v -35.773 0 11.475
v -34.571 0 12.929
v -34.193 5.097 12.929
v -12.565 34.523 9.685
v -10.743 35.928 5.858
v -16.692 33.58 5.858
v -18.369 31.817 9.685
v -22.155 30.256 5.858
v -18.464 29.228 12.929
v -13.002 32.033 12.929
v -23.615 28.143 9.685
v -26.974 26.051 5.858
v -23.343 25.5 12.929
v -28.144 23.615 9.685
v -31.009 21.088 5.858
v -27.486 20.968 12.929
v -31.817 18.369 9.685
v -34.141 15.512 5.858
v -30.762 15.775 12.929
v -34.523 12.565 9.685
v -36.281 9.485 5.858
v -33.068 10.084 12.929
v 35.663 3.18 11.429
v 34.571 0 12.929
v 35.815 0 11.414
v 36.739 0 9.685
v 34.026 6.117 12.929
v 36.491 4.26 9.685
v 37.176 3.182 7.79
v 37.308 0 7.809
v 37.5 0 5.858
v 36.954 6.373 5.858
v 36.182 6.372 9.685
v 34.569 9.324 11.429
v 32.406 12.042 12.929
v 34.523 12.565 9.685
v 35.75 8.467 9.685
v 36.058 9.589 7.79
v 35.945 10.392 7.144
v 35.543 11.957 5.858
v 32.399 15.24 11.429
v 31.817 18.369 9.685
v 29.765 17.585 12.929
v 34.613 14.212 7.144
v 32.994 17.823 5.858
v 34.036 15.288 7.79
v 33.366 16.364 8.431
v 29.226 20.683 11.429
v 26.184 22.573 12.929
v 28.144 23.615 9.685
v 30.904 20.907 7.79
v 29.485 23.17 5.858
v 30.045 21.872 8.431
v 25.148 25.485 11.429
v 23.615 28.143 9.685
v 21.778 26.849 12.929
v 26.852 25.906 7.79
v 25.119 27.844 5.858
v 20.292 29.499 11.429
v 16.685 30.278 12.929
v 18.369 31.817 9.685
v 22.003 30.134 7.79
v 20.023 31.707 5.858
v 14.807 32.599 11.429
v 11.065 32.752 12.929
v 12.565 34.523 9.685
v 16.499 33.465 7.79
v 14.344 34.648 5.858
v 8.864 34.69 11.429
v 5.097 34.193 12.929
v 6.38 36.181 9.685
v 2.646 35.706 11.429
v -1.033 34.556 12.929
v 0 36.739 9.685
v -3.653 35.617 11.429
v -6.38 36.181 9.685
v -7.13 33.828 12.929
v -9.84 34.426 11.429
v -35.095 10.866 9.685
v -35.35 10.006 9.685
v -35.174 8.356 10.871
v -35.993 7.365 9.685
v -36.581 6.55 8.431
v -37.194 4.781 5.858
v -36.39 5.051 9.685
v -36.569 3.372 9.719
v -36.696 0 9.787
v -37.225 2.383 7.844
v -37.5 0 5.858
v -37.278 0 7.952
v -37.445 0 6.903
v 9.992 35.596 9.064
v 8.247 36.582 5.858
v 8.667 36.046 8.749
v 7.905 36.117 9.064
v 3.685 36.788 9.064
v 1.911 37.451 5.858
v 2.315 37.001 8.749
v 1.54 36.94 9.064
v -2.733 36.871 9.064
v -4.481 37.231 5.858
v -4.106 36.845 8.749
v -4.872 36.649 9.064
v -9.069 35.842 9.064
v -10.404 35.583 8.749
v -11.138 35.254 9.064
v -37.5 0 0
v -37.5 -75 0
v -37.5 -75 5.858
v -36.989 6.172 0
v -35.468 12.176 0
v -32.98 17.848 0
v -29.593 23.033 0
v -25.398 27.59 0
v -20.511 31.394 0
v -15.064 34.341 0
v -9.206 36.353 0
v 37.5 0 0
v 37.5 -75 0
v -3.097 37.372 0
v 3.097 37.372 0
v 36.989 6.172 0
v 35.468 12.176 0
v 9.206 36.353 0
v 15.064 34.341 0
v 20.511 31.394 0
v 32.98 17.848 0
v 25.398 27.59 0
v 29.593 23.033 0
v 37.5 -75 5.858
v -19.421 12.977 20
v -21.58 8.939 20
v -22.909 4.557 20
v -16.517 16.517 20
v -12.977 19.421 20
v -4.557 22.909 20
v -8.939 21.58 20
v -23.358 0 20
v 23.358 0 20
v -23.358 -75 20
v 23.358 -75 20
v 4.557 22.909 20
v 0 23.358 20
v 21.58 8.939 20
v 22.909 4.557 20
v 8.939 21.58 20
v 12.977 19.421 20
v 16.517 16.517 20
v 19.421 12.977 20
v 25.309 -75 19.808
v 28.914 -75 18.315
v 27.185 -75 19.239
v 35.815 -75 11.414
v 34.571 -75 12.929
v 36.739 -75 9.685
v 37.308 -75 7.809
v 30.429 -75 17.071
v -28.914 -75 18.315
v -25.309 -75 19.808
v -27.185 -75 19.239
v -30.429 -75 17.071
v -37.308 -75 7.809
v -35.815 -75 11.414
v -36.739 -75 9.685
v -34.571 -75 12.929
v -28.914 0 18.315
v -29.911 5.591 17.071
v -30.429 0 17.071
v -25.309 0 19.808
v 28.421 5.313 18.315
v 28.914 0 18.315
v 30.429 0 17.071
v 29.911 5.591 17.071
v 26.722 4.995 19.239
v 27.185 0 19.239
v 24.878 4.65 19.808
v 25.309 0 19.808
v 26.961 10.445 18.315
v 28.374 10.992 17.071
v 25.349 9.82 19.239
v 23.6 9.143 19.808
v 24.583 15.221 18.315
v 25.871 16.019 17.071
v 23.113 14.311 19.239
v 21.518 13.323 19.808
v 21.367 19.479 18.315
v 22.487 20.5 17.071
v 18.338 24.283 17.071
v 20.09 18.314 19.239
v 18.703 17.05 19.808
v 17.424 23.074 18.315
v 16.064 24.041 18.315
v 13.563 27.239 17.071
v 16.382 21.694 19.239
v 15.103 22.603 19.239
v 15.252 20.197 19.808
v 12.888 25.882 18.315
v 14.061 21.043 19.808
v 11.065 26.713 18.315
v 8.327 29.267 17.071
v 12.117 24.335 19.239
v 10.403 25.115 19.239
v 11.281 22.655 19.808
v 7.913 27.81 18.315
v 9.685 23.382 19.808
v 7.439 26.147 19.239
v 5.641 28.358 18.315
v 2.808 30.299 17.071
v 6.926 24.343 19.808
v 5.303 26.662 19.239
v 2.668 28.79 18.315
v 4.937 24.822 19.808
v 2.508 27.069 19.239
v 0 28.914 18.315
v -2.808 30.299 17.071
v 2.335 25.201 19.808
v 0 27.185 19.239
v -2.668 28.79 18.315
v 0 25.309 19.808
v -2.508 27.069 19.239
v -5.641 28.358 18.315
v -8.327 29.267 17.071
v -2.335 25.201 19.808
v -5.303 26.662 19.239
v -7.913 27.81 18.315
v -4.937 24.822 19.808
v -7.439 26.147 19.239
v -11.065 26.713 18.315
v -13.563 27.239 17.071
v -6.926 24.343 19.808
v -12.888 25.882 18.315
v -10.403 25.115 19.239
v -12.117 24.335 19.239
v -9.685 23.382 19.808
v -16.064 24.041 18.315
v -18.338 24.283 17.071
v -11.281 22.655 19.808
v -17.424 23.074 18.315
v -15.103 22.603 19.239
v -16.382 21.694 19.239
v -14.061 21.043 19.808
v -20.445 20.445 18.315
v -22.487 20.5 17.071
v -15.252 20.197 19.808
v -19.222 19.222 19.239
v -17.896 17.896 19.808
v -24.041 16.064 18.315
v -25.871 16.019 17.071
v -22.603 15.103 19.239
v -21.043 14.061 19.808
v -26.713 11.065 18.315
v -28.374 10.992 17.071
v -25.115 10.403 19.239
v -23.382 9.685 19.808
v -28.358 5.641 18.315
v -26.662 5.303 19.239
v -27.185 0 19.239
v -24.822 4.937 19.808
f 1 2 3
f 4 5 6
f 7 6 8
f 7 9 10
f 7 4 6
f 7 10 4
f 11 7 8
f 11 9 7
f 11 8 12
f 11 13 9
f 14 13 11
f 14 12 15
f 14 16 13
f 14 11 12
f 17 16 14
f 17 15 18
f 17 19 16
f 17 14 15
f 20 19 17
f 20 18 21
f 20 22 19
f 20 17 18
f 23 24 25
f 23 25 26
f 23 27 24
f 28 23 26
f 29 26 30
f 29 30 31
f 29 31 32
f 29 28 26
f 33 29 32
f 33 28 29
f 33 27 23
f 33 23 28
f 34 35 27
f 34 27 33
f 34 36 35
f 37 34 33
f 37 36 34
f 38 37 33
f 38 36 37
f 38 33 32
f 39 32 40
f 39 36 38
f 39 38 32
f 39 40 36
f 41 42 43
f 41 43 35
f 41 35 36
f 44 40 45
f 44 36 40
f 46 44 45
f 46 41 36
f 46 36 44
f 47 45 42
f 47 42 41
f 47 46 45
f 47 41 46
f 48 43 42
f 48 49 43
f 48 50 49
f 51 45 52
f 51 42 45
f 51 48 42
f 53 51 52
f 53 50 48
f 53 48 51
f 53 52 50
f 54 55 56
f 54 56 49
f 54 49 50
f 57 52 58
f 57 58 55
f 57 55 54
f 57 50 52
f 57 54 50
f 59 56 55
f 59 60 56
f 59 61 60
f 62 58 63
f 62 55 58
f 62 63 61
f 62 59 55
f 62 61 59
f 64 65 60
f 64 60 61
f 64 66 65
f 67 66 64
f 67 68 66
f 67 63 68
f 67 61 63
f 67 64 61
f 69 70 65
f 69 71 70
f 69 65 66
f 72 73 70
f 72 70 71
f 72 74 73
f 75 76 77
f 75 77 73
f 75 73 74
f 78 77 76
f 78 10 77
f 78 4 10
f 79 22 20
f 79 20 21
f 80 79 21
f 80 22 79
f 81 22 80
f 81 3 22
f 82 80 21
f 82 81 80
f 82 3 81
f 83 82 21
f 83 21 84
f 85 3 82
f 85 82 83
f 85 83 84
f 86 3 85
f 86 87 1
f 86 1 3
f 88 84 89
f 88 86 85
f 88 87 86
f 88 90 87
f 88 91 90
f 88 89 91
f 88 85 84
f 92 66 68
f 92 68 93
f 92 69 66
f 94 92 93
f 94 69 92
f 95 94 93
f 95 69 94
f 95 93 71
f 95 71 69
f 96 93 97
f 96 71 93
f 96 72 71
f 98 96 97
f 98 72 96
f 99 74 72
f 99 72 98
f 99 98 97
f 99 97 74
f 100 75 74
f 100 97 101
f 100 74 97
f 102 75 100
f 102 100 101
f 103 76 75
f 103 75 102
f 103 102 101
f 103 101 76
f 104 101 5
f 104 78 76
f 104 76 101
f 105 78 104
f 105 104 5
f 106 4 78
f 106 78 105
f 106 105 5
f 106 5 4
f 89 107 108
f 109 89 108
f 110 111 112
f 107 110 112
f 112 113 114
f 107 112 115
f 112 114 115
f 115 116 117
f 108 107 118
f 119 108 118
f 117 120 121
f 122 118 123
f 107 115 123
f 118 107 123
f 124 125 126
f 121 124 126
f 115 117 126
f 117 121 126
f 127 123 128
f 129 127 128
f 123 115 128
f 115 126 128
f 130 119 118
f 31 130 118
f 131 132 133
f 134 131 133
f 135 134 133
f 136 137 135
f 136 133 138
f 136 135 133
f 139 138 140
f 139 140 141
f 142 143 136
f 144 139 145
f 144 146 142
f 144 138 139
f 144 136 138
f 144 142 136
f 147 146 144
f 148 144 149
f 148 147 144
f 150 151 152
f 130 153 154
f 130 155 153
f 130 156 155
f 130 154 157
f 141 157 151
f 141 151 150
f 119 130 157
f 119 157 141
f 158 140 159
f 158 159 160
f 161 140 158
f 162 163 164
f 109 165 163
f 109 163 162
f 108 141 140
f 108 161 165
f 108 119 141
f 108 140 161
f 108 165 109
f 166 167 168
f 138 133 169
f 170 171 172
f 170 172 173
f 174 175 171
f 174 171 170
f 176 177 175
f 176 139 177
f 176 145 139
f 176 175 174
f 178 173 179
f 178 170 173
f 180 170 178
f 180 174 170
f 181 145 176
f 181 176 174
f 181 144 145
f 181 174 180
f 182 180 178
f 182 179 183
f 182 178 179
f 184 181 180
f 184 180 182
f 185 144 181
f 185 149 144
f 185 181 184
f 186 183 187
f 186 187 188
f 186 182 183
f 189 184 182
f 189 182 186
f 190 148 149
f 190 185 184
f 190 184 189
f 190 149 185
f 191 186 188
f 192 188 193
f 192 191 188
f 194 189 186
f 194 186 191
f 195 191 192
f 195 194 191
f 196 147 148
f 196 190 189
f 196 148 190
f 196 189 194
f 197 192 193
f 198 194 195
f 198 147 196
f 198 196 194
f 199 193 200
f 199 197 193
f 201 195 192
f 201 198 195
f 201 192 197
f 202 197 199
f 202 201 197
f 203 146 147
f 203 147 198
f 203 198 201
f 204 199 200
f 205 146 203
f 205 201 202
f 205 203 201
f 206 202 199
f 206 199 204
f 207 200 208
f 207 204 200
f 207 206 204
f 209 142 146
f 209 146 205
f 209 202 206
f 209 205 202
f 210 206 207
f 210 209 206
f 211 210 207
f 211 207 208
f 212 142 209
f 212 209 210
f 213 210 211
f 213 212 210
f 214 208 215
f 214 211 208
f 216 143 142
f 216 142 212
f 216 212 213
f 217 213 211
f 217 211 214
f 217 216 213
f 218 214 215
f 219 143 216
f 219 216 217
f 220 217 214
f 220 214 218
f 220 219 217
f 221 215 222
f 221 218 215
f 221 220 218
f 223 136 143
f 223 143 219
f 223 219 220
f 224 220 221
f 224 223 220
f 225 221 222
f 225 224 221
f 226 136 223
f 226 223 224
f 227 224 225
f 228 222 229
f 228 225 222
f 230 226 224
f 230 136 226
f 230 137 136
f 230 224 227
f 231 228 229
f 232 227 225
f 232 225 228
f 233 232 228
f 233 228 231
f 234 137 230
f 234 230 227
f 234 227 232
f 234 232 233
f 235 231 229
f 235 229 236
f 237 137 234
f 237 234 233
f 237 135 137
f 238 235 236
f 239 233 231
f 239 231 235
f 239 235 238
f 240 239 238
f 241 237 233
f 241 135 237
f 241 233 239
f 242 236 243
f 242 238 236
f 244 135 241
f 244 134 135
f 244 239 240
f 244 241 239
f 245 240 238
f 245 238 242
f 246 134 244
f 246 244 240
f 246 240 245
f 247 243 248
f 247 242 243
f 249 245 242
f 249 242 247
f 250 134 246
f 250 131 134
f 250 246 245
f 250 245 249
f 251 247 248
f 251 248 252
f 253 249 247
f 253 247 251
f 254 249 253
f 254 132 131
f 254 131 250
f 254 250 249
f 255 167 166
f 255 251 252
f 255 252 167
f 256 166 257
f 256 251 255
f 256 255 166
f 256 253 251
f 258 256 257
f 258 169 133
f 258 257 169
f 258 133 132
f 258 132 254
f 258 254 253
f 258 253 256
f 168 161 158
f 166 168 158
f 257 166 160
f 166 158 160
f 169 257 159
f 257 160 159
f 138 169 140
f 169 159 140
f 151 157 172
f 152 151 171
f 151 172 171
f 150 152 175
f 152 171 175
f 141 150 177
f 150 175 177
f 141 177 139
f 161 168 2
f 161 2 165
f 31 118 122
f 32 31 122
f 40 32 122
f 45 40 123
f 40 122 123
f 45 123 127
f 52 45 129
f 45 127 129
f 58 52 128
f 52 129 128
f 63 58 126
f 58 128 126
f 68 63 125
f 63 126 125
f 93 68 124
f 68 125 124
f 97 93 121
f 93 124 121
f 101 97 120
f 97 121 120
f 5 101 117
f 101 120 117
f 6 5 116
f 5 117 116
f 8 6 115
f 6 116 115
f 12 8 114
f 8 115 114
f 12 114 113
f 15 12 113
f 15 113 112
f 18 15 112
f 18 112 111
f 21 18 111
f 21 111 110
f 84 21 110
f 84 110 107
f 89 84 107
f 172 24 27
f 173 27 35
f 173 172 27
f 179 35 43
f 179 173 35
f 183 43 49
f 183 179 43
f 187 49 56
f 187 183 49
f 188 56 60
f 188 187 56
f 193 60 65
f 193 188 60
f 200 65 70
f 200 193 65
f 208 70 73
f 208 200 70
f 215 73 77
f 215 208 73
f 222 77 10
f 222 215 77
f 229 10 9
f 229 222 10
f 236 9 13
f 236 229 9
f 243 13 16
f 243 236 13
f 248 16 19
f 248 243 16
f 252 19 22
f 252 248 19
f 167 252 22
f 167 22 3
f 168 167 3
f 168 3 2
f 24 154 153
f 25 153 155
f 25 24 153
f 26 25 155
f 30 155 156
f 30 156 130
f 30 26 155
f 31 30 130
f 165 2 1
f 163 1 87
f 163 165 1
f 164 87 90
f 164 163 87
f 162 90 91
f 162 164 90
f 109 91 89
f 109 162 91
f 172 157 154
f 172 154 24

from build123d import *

# Parameters (mm, degrees)
BOSS_EXTRUDE1_DEPTH = 20
CHAMFER1_SIZE       = 10
FILLET1_R           = 10
FILLET2_R           = 10
SKETCH9_W           = 105
SKETCH9_H           = 30
CUT_EXTRUDE2_DEPTH  = 109.656569187


with BuildPart() as part:
    # Sketch1 → Boss-Extrude1 (new body)
    with BuildSketch(Plane.XY):
        with BuildLine():
            Line((-37.5, 0), (-37.5, -100))
            Line((-37.5, -100), (37.5, -100))
            Line((37.5, -100), (37.5, 0))
            ThreePointArc((37.5, 0), (0, 37.5), (-37.5, 0))
        make_face()
    extrude(amount=BOSS_EXTRUDE1_DEPTH)

    # Chamfer1
    chamfer1_edges = [part.edges().sort_by_distance(p)[0] for p in [
        (-37.5, -50, 20),
        (0, 37.5, 20),
        (37.5, -50, 20),
    ]]
    chamfer(chamfer1_edges, length=CHAMFER1_SIZE)

    # Fillet1
    fillet1_edges = [part.edges().sort_by_distance(p)[0] for p in [
        (-27.5, -50, 20),
        (0, 27.5, 20),
        (27.5, -50, 20),
    ]]
    fillet(fillet1_edges, radius=FILLET1_R)

    # Fillet2
    fillet2_edges = [part.edges().sort_by_distance(p)[0] for p in [
        (37.5, -50, 10),
        (0, 37.5, 10),
        (-37.5, -50, 10),
    ]]
    fillet(fillet2_edges, radius=FILLET2_R)

    # Sketch9 → Cut-Extrude2 (cut, through all)
    with BuildSketch(Plane(origin=(0, 0, 0), x_dir=(-1, 0, 0), z_dir=(0, 0, -1))):
        with Locations((0, -90)):
            Rectangle(SKETCH9_W, SKETCH9_H)
    extrude(amount=-CUT_EXTRUDE2_DEPTH, mode=Mode.SUBTRACT)


solid = part.part
